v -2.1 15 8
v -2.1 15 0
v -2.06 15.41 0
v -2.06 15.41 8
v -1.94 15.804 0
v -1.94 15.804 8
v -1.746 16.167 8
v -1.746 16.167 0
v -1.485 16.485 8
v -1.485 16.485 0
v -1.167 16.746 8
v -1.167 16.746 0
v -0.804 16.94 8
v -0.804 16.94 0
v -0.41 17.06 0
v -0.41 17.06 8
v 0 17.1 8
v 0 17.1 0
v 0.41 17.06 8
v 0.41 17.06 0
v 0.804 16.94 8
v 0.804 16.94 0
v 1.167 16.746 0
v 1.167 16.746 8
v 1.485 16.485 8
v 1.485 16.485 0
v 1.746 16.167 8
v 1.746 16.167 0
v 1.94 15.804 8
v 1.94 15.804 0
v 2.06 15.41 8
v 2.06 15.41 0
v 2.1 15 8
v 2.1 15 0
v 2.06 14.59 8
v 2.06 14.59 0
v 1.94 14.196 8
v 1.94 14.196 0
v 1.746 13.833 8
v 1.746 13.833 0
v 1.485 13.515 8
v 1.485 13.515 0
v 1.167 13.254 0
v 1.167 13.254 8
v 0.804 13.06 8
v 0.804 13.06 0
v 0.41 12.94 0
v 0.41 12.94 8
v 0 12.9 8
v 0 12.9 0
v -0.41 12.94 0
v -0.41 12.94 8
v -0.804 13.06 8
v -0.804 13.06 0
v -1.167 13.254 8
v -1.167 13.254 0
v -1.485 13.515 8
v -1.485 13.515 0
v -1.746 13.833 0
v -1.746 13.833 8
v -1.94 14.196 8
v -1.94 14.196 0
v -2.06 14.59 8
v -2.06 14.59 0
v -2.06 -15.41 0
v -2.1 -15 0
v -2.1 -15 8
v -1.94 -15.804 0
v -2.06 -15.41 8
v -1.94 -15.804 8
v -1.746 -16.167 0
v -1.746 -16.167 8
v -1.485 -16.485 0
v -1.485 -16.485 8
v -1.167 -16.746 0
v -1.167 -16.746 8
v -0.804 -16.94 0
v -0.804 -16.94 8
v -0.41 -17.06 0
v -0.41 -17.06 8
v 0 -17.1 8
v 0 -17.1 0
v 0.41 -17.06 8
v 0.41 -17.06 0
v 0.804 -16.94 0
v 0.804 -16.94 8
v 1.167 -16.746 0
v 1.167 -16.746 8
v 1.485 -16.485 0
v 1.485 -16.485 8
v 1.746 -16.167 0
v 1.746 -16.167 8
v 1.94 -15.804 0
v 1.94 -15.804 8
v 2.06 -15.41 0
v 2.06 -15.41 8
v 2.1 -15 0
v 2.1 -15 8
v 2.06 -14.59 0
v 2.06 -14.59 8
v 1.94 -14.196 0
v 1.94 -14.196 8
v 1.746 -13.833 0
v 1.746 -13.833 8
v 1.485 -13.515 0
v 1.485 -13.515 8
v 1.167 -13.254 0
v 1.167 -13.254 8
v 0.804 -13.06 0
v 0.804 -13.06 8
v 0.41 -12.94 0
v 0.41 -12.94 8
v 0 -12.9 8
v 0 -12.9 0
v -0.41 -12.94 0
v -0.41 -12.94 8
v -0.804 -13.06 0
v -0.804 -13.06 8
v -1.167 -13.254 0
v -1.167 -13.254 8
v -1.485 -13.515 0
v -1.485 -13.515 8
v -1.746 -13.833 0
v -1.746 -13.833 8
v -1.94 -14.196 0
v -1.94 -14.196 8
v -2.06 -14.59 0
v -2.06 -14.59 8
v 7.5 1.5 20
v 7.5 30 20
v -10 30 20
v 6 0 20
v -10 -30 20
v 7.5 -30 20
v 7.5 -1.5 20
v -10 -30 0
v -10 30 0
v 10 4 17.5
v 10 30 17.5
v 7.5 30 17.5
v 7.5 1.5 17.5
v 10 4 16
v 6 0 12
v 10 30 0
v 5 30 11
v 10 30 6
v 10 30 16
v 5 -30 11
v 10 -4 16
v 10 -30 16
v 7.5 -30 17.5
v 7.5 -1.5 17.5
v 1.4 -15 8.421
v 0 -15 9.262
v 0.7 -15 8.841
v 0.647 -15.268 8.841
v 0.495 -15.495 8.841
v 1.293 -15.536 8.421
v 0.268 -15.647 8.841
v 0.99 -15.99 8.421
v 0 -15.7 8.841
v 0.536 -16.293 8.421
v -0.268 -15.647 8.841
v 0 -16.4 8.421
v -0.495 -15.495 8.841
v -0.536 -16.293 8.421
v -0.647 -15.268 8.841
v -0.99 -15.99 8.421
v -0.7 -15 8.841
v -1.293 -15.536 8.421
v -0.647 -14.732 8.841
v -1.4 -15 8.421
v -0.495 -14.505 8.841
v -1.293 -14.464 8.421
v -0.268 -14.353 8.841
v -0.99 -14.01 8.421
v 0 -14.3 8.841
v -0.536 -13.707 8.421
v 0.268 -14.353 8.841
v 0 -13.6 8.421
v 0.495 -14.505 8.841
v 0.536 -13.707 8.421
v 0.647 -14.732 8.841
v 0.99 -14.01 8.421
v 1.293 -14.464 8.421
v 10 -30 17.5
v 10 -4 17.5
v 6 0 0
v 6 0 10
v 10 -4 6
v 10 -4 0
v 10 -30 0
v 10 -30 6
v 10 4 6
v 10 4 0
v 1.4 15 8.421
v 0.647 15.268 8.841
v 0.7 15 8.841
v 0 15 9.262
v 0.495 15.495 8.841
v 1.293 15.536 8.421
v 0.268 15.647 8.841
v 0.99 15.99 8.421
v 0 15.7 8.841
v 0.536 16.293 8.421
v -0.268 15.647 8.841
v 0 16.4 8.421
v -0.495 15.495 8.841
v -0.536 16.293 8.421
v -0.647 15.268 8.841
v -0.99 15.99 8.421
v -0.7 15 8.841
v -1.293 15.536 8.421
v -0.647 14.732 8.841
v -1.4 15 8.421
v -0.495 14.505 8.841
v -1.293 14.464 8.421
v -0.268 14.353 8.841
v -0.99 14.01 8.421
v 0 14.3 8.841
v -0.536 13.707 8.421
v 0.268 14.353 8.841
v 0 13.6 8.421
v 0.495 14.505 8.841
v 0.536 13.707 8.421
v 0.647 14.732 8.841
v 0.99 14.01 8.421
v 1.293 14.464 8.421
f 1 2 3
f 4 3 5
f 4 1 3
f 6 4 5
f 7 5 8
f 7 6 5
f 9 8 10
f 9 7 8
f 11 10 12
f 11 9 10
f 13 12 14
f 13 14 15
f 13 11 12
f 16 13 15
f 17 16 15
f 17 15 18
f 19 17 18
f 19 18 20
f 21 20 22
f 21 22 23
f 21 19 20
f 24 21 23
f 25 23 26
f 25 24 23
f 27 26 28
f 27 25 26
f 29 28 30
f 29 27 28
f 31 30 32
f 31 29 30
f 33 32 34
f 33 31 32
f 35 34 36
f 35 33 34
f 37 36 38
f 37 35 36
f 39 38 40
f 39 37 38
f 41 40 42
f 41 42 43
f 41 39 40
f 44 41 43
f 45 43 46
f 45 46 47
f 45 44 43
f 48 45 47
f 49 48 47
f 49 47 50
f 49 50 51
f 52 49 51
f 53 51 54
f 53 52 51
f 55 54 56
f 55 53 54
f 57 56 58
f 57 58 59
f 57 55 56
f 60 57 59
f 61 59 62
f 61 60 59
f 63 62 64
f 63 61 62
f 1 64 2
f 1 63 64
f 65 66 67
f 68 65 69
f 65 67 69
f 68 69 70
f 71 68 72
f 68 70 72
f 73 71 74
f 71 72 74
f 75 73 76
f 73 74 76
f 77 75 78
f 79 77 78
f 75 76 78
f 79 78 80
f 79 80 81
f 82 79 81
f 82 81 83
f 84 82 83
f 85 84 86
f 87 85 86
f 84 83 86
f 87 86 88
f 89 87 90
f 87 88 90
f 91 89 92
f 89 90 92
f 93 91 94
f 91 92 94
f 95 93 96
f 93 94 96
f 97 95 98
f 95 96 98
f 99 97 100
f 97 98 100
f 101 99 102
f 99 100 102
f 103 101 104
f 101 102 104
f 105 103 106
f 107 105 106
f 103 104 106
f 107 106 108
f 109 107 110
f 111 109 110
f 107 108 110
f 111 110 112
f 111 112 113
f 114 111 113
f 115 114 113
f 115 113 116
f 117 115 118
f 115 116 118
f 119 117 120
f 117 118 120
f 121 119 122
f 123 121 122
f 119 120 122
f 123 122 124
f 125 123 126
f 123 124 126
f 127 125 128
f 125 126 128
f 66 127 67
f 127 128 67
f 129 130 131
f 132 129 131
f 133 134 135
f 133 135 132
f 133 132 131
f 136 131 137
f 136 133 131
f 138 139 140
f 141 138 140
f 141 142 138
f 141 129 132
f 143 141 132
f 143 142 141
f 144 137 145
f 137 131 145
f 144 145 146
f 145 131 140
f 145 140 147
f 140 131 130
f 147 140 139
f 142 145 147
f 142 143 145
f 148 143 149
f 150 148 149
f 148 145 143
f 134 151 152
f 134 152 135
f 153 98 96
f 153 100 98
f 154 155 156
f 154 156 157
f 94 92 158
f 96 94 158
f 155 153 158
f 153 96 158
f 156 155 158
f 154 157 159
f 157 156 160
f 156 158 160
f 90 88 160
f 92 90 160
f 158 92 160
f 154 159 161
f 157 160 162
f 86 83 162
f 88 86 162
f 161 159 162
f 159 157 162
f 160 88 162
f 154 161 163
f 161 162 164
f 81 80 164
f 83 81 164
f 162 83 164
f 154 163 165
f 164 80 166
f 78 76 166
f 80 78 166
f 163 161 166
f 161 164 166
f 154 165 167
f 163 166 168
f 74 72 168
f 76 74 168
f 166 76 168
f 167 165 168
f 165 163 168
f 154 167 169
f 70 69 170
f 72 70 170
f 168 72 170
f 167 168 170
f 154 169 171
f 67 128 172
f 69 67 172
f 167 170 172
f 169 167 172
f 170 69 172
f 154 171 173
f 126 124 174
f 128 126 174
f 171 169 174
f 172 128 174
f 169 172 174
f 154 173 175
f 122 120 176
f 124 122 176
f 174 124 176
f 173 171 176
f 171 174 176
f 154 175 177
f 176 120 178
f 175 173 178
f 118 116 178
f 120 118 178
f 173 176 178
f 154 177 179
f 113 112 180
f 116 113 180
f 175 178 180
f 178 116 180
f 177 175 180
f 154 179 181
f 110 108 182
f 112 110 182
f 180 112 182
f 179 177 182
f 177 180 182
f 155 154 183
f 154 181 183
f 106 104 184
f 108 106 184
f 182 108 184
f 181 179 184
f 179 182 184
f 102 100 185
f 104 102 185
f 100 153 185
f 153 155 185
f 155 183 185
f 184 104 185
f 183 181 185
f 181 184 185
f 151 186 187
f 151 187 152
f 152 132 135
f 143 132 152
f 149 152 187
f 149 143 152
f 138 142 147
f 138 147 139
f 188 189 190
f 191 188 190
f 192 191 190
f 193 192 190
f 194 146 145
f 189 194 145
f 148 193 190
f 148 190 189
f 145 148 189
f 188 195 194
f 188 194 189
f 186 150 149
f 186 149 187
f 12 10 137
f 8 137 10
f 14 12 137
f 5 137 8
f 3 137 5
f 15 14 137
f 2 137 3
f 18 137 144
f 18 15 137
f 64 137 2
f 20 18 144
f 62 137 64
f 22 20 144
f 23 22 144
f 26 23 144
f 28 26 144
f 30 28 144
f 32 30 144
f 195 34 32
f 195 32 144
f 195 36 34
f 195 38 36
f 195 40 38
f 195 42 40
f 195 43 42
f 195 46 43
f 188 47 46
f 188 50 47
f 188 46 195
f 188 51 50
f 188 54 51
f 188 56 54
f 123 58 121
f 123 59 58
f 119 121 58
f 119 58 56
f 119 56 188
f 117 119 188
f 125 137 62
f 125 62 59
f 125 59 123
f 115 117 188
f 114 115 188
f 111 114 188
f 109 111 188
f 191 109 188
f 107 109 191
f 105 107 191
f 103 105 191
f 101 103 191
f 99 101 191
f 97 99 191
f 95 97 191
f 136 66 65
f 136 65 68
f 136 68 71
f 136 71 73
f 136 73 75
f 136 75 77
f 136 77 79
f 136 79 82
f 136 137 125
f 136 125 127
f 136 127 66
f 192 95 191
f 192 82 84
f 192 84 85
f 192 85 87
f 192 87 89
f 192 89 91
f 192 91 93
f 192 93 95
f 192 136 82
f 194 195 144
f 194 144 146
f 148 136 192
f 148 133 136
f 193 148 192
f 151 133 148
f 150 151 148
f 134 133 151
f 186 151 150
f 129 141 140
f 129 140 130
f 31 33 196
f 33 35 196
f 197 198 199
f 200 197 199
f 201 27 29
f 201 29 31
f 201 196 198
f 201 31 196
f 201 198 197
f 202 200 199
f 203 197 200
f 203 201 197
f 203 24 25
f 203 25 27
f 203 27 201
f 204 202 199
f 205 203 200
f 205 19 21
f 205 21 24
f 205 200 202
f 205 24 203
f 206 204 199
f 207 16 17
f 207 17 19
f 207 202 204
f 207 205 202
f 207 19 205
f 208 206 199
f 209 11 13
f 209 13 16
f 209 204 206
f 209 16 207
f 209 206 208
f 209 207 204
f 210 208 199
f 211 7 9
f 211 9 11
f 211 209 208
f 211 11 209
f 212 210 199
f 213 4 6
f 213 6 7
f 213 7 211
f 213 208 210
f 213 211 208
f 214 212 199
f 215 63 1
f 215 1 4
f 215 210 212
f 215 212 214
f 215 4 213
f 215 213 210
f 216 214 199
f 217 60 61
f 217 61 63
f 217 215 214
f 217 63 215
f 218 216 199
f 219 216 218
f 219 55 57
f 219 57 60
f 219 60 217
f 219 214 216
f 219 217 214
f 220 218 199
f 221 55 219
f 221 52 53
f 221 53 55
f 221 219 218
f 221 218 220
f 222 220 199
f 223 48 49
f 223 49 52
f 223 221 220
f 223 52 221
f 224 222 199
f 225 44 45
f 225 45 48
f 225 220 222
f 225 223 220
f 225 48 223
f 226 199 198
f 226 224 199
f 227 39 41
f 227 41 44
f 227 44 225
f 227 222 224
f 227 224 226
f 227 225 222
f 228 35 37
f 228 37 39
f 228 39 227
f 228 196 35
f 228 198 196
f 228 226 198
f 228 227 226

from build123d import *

# Parameters (mm, degrees)
F1_DEPTH = 30
F3_D     = 4.2
F3_DEPTH = 8
F3_TIP   = 1.2618073
F6_DEPTH = 20


with BuildPart() as f1:
    # F0 (on Front) → F1 (new body)
    with BuildSketch(Plane.XZ):
        Polygon((-10, 0), (10, 0), (10, 6), (5, 11), (10, 16), (10, 17.5), (7.5, 17.5), (7.5, 20), (-10, 20), align=None)
    extrude(amount=F1_DEPTH)

    # F3
    with Locations(Plane(origin=(0, 0, 0), x_dir=(1, 0, 0), z_dir=(0, 0, -1))):
        with Locations((0, 15)):
            Hole(F3_D / 2, depth=F3_DEPTH)
            with Locations((0, 0, -(F3_DEPTH + F3_TIP / 2))):  # 118° drill point
                Cone(0, F3_D / 2, F3_TIP, mode=Mode.SUBTRACT)

    # F4: F1 across plane


with BuildPart() as f1_1:
    add(f1.part)
    add(f1.part.mirror(Plane.XZ))

    # F5 (on Top) → F6 (cut, through all)
    with BuildSketch(Plane.XY):
        Polygon((10, 4), (6, 0), (10, -4), align=None)
    extrude(amount=F6_DEPTH, mode=Mode.SUBTRACT)


solid = f1_1.part
